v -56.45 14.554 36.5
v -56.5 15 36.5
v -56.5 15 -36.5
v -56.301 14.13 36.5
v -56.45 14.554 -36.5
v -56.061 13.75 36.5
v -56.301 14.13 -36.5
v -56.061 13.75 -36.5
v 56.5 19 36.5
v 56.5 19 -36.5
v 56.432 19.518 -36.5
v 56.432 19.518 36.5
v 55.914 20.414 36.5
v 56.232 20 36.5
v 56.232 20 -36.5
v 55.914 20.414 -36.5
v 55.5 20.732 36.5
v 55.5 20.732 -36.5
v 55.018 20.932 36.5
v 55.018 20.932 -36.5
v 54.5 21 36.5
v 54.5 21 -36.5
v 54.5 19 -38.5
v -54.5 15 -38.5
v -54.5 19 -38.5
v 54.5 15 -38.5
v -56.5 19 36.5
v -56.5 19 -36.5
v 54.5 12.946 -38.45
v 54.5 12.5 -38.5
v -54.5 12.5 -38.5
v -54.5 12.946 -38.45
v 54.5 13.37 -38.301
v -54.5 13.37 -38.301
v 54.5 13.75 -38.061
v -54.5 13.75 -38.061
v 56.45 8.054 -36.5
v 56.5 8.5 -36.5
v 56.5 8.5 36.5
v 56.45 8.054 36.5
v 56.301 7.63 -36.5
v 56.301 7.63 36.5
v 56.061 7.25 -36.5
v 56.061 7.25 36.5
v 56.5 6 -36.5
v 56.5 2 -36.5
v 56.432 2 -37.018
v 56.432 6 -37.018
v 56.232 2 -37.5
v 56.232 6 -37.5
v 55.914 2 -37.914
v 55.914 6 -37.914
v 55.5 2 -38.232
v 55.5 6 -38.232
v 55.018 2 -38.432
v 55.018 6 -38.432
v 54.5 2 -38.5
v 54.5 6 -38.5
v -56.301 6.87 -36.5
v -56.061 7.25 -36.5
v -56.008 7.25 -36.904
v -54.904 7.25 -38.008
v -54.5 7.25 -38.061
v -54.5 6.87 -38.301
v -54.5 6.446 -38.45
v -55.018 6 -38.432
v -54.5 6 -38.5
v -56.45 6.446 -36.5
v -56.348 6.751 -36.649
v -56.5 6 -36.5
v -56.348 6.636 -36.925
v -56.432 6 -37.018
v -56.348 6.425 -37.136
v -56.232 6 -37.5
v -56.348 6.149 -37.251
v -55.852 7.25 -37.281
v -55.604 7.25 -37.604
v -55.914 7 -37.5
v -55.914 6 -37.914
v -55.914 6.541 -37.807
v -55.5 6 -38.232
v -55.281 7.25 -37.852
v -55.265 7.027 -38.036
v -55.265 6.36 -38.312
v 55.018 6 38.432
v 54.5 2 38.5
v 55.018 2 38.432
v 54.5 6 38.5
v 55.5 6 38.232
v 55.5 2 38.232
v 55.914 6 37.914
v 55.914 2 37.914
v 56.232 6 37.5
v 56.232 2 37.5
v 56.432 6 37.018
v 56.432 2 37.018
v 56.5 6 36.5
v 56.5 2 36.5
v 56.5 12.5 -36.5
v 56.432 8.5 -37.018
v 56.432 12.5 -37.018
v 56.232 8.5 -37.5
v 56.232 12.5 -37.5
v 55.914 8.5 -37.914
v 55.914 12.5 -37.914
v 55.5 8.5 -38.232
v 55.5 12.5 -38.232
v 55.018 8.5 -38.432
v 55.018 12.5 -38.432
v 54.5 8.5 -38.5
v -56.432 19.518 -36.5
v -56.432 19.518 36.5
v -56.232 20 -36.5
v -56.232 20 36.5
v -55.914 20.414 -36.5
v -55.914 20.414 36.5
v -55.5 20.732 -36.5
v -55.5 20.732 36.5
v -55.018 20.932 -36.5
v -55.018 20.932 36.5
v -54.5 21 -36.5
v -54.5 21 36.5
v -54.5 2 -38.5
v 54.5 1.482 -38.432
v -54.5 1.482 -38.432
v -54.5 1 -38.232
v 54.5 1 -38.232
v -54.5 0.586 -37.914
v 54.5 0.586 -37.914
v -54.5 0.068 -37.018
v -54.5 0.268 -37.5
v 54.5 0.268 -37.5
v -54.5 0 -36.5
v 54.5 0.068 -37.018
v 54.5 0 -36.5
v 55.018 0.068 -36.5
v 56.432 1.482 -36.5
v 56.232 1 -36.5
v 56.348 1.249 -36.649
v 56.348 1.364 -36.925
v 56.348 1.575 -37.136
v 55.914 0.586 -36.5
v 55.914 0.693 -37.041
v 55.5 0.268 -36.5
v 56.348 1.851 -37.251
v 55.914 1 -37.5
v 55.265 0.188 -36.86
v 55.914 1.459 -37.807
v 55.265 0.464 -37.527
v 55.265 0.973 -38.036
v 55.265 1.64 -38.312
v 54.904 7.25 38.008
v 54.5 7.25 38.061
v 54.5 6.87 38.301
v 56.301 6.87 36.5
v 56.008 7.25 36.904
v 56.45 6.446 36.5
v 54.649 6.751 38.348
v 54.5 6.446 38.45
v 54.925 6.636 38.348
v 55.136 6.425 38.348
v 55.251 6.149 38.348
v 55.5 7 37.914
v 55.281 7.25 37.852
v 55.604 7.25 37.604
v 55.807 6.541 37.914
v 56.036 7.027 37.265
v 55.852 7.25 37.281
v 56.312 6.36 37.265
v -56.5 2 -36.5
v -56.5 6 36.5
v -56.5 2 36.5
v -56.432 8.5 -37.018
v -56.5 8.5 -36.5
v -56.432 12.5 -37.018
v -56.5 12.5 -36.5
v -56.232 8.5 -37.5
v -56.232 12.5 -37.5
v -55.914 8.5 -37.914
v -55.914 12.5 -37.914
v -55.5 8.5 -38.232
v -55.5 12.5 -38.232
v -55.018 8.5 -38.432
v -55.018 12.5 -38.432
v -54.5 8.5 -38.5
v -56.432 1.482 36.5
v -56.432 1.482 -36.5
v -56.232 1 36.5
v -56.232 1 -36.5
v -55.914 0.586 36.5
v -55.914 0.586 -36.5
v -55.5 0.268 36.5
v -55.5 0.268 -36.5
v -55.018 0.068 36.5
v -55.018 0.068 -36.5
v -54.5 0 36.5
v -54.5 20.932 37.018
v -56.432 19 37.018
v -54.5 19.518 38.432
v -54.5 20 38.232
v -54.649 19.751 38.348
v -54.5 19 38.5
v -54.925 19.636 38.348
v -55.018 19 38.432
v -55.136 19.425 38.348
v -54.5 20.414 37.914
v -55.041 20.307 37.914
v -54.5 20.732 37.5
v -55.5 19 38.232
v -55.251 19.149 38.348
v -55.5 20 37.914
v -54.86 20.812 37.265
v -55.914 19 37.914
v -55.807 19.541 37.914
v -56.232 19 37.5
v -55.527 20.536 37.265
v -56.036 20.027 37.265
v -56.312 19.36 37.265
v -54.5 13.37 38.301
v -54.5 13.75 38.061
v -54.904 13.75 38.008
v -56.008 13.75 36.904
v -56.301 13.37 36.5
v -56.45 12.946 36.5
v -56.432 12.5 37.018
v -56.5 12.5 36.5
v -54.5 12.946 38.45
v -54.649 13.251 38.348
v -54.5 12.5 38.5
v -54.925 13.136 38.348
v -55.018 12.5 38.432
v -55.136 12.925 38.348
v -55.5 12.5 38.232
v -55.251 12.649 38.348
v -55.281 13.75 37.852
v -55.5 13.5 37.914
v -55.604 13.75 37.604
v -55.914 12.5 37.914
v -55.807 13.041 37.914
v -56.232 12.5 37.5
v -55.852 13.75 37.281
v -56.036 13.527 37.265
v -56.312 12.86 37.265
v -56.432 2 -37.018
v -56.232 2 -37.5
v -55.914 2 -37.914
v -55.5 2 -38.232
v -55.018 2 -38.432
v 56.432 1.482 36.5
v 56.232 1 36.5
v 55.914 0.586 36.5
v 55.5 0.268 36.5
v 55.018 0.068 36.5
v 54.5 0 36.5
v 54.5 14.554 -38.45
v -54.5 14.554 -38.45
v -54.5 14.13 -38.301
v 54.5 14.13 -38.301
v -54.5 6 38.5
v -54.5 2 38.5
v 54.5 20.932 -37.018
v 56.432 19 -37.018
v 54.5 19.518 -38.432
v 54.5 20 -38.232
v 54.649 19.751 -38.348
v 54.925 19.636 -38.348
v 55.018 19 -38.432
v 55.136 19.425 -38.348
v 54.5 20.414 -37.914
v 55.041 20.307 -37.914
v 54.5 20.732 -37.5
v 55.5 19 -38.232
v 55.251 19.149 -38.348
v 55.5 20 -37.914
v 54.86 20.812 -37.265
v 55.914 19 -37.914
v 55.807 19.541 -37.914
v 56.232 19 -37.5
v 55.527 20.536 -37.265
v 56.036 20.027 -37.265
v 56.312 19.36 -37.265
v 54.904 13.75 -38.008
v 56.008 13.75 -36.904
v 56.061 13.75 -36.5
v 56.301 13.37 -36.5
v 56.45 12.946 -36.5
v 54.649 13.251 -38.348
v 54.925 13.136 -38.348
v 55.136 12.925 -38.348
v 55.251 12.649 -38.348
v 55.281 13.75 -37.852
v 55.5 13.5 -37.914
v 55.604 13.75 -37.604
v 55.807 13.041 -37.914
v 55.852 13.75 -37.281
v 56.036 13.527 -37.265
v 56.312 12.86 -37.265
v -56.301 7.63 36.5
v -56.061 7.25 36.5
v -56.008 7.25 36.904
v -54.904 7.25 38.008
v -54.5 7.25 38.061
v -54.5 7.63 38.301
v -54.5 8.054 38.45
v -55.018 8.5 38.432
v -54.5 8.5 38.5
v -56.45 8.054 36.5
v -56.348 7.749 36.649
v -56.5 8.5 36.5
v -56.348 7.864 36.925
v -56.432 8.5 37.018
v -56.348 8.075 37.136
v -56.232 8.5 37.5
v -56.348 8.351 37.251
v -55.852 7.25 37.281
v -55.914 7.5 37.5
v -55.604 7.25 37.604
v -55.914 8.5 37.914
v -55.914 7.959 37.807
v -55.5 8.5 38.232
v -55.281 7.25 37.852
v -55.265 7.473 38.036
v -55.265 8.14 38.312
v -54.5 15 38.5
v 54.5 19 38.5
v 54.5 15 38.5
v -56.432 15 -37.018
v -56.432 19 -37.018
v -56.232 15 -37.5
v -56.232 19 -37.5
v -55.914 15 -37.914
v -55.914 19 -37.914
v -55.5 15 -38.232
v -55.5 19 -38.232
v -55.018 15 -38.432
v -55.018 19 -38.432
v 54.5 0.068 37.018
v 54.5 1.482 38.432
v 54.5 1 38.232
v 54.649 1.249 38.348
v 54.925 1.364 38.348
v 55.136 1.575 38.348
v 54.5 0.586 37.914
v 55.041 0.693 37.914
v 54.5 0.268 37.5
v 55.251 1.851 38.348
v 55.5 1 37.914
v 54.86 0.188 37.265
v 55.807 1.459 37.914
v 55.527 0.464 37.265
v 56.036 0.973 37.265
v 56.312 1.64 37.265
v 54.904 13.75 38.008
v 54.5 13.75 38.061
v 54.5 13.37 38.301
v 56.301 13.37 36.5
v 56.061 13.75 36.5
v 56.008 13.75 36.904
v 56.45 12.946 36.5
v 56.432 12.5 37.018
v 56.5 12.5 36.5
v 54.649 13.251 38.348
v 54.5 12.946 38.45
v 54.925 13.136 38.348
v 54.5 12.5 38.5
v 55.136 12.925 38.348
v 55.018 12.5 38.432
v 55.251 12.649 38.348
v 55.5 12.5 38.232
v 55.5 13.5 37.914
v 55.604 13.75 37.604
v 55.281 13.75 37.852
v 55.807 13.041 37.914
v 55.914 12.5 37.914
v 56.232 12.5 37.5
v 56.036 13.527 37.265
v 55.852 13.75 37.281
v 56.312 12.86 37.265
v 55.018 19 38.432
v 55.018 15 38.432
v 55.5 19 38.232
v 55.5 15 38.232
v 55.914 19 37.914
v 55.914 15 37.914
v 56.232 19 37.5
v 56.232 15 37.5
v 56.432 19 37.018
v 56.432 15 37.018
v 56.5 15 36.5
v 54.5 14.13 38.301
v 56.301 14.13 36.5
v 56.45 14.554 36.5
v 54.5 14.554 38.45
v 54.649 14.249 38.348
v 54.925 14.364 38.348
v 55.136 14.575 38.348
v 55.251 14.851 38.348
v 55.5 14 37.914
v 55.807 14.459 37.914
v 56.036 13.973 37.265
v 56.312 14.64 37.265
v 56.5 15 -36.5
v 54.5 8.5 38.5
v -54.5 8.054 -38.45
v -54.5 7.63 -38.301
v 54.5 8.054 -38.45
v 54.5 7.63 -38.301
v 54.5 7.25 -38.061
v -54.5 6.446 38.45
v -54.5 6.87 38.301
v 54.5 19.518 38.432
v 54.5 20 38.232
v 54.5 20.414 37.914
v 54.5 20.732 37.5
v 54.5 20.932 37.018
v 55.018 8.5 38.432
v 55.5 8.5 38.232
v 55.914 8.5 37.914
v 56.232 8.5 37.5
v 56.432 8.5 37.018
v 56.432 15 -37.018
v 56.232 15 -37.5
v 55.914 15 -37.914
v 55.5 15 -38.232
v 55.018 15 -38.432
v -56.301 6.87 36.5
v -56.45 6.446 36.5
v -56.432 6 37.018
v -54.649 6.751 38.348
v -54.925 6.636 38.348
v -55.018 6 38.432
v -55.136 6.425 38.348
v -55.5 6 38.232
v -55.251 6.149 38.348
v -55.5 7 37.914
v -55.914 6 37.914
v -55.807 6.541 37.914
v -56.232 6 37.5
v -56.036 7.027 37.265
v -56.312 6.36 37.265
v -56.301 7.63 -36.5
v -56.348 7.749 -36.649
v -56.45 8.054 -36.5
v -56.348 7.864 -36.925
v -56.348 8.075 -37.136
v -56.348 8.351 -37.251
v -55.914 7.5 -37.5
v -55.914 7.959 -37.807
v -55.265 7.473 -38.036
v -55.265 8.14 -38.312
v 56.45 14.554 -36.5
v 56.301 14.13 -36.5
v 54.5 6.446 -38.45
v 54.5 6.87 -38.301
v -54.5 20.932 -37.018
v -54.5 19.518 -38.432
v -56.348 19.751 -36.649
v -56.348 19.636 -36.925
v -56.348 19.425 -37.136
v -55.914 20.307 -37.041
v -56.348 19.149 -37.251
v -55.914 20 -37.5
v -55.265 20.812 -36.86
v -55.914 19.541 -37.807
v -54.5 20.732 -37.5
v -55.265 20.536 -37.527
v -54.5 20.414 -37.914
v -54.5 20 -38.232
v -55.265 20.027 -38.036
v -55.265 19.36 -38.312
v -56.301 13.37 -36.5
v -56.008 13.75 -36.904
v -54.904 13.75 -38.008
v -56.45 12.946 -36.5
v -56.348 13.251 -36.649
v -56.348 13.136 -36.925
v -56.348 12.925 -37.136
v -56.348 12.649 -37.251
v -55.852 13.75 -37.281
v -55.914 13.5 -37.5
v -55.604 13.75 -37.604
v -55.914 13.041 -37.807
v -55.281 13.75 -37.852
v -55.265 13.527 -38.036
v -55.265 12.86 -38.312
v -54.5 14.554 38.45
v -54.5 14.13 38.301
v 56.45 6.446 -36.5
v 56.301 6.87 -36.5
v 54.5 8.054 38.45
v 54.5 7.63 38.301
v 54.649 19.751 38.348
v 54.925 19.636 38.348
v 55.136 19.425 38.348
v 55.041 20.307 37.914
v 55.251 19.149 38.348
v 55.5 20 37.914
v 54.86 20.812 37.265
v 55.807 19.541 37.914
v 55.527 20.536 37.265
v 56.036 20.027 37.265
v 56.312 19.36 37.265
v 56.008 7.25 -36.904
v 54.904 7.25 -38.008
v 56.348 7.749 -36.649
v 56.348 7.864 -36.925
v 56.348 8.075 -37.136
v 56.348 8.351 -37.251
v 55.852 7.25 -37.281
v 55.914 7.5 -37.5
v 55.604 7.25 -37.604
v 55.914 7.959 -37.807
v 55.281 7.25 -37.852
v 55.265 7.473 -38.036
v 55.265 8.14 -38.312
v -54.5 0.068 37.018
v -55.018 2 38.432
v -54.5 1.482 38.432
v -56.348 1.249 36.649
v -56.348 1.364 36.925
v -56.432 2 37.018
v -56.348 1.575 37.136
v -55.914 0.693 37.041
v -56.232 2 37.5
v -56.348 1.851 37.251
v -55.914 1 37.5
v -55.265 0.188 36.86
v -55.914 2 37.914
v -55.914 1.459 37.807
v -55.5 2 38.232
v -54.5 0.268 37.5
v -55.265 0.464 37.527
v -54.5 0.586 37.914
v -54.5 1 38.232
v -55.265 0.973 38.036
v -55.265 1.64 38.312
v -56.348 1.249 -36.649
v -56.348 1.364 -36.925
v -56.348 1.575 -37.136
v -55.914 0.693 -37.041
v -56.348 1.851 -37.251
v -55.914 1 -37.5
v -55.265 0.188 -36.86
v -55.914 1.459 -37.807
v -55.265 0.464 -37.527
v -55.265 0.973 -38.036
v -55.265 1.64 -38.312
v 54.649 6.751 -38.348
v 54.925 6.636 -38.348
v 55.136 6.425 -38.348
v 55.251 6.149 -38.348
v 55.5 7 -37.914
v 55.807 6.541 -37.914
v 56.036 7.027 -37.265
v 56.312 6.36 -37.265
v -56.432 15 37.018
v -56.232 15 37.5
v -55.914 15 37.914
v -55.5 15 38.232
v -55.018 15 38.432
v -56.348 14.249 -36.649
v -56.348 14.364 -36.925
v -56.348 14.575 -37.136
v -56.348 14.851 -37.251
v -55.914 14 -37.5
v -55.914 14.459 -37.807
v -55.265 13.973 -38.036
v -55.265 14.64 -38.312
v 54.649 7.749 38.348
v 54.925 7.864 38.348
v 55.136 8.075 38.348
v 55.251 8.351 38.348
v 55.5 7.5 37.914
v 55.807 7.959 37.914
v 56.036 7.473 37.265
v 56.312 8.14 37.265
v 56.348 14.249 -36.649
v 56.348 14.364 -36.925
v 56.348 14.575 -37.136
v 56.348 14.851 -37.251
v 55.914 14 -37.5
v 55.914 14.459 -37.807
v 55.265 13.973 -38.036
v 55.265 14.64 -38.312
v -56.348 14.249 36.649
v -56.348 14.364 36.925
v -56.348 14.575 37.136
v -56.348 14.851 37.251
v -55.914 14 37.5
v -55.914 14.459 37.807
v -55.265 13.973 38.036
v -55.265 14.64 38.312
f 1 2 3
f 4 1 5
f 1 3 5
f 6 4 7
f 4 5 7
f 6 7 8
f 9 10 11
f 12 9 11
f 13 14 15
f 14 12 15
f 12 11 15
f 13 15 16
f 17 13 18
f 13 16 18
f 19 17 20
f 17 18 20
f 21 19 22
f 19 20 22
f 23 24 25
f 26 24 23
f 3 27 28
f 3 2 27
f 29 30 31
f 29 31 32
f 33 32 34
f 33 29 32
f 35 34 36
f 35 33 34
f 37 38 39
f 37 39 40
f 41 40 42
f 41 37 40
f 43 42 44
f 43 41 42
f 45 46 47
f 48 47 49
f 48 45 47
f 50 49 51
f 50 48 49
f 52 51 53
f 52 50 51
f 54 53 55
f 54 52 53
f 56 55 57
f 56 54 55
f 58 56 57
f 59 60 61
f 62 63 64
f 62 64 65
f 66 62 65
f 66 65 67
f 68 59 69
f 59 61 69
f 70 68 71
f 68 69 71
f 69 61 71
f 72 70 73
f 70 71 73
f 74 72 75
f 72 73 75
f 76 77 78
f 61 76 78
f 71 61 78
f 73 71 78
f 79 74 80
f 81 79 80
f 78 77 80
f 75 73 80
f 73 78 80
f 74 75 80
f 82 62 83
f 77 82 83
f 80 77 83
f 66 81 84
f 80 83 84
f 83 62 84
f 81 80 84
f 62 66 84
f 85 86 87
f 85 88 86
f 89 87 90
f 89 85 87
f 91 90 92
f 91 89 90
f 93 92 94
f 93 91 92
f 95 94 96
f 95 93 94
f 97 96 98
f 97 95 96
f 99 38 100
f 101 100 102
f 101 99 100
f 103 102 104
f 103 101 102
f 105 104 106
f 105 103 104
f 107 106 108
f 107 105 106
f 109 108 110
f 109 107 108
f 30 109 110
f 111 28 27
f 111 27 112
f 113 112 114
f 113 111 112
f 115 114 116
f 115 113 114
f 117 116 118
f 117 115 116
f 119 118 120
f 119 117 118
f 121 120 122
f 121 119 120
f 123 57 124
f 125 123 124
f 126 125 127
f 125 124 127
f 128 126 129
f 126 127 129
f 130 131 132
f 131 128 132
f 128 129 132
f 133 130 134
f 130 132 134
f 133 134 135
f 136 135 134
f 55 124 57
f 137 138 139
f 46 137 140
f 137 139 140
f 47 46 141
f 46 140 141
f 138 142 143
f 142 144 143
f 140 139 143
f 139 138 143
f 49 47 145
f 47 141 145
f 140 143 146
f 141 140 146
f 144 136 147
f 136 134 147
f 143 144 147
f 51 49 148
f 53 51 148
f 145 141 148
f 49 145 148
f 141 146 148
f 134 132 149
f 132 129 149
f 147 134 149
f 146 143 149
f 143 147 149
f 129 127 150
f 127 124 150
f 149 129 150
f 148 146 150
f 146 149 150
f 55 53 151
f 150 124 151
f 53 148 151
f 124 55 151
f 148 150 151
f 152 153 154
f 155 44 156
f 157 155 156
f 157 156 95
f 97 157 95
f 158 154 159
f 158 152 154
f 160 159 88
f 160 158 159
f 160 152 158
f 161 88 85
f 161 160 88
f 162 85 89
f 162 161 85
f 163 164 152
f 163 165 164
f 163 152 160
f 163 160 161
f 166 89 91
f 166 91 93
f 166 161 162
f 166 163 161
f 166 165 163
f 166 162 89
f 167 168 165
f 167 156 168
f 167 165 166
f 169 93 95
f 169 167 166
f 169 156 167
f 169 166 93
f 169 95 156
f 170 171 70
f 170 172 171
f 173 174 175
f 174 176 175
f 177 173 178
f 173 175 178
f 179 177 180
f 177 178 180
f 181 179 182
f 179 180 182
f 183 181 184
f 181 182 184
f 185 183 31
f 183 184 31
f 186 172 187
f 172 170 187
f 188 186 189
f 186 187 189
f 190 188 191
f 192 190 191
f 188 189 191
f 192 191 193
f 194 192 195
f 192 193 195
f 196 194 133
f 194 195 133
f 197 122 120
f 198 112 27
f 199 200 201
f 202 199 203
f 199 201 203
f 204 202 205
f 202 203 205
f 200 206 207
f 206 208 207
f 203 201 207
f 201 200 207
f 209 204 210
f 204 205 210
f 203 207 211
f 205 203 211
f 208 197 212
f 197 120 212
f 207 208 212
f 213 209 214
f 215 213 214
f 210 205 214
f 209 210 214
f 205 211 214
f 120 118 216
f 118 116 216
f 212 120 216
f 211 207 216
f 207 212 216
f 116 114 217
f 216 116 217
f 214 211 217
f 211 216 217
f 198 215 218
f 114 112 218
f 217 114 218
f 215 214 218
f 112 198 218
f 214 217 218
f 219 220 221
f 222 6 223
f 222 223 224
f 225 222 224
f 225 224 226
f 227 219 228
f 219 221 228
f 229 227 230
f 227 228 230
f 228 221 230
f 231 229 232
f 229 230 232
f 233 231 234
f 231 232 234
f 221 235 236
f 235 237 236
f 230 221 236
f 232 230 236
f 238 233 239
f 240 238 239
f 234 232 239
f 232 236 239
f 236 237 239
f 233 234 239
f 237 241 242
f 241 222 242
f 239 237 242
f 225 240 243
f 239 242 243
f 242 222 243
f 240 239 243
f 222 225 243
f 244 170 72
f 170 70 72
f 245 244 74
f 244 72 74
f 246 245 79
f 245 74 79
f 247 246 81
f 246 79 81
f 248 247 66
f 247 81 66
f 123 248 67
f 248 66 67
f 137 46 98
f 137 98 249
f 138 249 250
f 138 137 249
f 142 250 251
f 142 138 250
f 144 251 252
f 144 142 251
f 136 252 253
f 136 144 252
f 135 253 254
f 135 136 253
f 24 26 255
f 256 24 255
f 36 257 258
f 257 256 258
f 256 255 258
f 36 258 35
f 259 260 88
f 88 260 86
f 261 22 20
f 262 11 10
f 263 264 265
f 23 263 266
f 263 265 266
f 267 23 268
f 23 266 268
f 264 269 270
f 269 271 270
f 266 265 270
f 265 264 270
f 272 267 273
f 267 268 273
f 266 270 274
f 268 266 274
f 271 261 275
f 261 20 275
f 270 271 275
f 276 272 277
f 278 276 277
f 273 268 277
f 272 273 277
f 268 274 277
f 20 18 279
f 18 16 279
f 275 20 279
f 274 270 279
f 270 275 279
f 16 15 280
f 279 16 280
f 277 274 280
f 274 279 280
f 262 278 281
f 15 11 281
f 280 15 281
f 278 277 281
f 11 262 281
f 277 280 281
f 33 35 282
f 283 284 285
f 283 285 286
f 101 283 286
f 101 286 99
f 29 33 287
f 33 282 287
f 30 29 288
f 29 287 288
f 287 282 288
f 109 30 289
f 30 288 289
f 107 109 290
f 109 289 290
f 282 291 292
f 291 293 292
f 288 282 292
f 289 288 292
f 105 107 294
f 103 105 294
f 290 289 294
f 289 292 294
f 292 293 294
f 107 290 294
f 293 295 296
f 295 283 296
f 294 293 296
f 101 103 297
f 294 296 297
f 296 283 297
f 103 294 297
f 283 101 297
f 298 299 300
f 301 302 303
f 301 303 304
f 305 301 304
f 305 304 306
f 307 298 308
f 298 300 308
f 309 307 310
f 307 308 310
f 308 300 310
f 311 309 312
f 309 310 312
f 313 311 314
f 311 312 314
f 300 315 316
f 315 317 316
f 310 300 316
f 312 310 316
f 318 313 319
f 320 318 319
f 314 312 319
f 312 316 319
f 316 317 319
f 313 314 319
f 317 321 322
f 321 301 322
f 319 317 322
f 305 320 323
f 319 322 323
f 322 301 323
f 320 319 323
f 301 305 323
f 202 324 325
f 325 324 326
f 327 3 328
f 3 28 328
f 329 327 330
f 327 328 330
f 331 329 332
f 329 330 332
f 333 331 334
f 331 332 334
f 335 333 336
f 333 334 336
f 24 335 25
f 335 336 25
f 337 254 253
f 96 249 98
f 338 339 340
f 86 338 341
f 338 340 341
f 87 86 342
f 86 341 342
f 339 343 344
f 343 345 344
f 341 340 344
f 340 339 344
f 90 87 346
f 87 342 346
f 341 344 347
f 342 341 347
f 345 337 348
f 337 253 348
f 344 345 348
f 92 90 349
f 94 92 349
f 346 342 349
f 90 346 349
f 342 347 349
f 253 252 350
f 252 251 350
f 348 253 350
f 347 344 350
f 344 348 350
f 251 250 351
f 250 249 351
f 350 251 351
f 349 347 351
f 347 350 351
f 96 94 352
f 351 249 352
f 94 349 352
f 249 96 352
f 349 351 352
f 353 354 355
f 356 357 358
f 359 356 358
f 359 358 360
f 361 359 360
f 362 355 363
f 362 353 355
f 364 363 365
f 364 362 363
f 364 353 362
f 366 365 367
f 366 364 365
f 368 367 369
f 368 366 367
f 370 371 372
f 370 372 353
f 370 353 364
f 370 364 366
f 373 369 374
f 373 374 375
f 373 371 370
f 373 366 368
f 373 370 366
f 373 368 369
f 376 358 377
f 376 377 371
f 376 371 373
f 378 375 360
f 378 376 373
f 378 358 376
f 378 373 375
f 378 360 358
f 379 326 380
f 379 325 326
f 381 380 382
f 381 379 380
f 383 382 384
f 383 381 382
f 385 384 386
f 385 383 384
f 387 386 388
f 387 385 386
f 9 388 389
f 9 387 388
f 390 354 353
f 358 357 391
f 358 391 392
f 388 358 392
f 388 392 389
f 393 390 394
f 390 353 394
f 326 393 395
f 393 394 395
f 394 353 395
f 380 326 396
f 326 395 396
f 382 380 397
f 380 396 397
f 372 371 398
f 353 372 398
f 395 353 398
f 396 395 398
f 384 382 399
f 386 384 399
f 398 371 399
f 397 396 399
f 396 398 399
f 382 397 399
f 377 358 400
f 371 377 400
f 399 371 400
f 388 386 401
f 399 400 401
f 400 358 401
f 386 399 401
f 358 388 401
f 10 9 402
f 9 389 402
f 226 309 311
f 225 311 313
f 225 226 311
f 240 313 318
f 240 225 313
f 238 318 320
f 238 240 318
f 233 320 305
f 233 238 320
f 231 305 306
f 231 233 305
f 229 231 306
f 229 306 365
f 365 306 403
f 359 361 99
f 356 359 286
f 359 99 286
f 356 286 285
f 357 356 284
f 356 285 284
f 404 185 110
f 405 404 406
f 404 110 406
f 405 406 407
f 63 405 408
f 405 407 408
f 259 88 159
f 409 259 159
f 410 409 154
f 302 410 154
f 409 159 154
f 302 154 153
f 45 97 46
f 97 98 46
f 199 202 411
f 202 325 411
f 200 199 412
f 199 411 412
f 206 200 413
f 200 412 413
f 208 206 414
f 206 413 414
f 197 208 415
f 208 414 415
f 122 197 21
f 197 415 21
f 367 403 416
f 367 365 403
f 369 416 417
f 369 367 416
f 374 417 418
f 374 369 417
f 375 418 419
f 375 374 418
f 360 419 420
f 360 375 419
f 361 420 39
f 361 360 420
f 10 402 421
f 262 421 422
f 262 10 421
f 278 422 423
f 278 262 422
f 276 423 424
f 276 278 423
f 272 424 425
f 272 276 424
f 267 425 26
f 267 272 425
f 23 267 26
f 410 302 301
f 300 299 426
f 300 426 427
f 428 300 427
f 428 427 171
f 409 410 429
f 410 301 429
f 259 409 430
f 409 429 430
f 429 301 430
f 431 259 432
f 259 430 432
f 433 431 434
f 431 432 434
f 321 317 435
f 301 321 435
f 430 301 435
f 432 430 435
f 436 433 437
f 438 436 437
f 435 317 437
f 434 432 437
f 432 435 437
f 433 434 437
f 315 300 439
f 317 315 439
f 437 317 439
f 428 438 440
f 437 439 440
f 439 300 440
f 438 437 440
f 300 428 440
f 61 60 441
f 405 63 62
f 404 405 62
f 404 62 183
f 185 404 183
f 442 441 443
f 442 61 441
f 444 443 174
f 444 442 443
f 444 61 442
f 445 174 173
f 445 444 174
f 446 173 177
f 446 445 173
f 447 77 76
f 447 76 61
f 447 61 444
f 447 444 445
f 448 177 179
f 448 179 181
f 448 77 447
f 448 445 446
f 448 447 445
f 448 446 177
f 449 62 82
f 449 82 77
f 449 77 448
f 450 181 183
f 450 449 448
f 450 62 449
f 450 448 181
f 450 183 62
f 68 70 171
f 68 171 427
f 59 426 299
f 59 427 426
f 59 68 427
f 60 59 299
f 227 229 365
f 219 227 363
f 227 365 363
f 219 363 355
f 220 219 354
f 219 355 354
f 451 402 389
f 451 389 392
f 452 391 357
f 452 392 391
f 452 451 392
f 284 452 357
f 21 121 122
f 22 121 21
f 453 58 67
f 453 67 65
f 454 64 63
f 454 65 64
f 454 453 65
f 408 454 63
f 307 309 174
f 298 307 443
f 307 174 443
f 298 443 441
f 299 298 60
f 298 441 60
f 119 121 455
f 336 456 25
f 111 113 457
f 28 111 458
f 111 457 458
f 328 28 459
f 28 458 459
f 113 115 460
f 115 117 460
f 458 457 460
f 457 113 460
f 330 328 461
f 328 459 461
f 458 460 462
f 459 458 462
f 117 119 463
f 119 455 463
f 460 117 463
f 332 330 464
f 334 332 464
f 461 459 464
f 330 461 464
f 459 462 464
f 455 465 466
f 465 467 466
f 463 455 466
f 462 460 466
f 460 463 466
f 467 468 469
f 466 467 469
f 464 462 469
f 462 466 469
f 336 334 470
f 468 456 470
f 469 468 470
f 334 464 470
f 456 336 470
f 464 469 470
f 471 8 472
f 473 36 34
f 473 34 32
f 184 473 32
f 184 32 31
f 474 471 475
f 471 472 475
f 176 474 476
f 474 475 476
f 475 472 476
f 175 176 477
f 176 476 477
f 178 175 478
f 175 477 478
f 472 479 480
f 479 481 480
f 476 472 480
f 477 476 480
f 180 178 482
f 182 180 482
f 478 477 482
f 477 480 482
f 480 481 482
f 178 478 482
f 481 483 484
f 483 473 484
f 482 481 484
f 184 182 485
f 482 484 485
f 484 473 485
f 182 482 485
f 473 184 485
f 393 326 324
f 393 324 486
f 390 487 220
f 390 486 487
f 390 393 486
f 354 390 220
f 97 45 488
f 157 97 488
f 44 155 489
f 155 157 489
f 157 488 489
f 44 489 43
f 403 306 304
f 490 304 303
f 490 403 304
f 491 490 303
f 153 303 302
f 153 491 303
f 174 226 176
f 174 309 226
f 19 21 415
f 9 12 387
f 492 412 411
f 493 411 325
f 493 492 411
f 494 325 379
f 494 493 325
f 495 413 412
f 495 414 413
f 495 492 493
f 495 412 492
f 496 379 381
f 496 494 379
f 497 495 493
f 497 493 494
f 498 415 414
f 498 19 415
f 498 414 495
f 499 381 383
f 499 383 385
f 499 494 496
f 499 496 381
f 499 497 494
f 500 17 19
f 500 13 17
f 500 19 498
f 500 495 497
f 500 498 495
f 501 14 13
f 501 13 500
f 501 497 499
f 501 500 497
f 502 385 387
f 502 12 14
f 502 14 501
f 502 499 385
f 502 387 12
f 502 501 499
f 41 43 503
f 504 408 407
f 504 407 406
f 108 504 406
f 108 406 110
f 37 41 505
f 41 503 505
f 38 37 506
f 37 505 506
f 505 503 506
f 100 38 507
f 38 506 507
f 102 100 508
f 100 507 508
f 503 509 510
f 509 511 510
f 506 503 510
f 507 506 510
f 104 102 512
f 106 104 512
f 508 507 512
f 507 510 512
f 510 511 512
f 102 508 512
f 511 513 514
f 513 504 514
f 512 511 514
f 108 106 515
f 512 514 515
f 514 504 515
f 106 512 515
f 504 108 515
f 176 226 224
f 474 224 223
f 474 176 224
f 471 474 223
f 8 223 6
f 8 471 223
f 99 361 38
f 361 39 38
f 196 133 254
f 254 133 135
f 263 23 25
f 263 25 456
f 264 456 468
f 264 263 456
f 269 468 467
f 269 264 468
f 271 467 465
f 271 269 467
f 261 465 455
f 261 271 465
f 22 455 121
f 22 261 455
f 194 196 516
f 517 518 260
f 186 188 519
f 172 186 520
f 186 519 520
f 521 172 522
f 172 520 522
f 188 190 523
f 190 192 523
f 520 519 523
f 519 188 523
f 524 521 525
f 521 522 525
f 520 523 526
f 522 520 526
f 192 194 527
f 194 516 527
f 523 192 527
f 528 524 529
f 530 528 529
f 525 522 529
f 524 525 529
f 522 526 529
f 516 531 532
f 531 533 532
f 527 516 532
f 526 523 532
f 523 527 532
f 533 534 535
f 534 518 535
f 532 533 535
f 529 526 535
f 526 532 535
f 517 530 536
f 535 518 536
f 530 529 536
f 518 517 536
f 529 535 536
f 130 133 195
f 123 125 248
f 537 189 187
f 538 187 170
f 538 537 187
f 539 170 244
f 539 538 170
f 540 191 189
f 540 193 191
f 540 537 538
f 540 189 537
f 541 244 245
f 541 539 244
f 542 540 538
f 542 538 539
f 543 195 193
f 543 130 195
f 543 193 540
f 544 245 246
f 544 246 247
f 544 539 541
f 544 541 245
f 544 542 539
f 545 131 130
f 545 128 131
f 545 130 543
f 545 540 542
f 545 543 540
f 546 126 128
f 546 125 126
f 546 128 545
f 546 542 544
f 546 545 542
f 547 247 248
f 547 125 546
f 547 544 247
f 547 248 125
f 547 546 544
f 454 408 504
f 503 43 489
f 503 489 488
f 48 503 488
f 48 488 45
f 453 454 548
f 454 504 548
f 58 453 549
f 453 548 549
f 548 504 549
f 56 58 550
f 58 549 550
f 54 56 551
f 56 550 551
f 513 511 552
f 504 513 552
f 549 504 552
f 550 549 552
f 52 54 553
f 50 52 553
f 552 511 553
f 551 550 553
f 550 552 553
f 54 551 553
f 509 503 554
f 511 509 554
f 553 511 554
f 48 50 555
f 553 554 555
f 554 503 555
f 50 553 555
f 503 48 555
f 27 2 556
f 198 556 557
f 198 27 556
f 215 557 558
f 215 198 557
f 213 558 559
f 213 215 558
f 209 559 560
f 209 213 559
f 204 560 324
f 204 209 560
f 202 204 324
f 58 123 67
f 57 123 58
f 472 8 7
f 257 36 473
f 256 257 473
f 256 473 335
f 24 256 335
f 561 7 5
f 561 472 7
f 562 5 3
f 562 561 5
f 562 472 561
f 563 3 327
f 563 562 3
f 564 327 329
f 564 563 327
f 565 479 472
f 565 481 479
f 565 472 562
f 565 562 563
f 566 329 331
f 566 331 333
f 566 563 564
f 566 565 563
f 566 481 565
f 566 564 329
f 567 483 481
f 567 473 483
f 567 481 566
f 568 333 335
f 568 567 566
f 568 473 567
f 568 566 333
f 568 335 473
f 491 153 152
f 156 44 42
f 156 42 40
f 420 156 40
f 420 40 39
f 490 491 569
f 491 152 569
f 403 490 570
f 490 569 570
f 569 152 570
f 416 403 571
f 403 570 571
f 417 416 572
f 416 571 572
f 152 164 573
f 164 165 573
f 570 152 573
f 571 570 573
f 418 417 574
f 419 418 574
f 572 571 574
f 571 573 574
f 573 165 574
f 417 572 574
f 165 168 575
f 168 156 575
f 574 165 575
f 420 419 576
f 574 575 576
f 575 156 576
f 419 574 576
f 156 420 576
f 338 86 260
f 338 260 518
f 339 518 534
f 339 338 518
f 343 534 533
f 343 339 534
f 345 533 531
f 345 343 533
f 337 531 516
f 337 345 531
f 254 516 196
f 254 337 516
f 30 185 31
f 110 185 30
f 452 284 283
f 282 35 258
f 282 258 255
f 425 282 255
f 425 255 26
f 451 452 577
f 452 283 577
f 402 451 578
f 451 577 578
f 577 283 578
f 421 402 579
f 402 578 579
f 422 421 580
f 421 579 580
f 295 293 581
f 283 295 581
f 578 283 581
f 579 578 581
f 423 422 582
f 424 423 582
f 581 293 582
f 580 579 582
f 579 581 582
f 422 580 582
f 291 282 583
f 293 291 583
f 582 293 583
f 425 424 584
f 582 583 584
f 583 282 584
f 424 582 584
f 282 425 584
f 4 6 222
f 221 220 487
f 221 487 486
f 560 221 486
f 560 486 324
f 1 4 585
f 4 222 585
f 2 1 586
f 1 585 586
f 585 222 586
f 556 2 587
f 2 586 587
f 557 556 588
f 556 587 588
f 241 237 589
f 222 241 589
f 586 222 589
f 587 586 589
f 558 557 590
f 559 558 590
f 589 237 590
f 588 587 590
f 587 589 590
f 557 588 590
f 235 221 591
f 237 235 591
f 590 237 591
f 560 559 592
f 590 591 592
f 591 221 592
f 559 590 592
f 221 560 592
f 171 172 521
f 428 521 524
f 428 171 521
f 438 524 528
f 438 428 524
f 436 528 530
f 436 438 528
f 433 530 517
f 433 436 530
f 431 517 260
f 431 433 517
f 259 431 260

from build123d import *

# Parameters (mm, degrees)
SKETCH1_W           = 113
SKETCH1_H           = 77
BOSS_EXTRUDE1_DEPTH = 8
FILLET1_R           = 2
LPATTERN3_COUNT     = 3
LPATTERN3_PITCH     = 6.5


with BuildPart() as part:
    # Sketch1 → Boss-Extrude1 (new body)
    with BuildSketch(Plane(origin=(0, 0, 0), x_dir=(1, 0, 0), z_dir=(0, 1, 0))):
        Rectangle(SKETCH1_W, SKETCH1_H)
    extrude(amount=BOSS_EXTRUDE1_DEPTH)

    # Fillet1
    fillet1_edges = [part.edges().sort_by_distance(p)[0] for p in [
        (56.5, 8, 0),
        (0, 8, -38.5),
        (-56.5, 8, 0),
        (0, 0, -38.5),
        (56.5, 0, 0),
        (0, 0, 38.5),
        (-56.5, 0, 0),
        (0, 8, 38.5),
        (-56.5, 4, -38.5),
        (56.5, 4, -38.5),
        (56.5, 4, 38.5),
        (-56.5, 4, 38.5),
    ]]
    fillet(fillet1_edges, radius=FILLET1_R)


with BuildPart() as lpattern3_1:
    # LPattern3: pattern copy
    add(part.part.moved(Location(Vector(0, 1, 0) * (1 * LPATTERN3_PITCH))))


with BuildPart() as lpattern3_2:
    # LPattern3: pattern copy
    add(part.part.moved(Location(Vector(0, 1, 0) * (2 * LPATTERN3_PITCH))))


with BuildPart() as part_1:
    add(part.part)

    # Combine1: union LPattern3_2, LPattern3_1
    add(lpattern3_2.part)
    add(lpattern3_1.part)


solid = part_1.part
